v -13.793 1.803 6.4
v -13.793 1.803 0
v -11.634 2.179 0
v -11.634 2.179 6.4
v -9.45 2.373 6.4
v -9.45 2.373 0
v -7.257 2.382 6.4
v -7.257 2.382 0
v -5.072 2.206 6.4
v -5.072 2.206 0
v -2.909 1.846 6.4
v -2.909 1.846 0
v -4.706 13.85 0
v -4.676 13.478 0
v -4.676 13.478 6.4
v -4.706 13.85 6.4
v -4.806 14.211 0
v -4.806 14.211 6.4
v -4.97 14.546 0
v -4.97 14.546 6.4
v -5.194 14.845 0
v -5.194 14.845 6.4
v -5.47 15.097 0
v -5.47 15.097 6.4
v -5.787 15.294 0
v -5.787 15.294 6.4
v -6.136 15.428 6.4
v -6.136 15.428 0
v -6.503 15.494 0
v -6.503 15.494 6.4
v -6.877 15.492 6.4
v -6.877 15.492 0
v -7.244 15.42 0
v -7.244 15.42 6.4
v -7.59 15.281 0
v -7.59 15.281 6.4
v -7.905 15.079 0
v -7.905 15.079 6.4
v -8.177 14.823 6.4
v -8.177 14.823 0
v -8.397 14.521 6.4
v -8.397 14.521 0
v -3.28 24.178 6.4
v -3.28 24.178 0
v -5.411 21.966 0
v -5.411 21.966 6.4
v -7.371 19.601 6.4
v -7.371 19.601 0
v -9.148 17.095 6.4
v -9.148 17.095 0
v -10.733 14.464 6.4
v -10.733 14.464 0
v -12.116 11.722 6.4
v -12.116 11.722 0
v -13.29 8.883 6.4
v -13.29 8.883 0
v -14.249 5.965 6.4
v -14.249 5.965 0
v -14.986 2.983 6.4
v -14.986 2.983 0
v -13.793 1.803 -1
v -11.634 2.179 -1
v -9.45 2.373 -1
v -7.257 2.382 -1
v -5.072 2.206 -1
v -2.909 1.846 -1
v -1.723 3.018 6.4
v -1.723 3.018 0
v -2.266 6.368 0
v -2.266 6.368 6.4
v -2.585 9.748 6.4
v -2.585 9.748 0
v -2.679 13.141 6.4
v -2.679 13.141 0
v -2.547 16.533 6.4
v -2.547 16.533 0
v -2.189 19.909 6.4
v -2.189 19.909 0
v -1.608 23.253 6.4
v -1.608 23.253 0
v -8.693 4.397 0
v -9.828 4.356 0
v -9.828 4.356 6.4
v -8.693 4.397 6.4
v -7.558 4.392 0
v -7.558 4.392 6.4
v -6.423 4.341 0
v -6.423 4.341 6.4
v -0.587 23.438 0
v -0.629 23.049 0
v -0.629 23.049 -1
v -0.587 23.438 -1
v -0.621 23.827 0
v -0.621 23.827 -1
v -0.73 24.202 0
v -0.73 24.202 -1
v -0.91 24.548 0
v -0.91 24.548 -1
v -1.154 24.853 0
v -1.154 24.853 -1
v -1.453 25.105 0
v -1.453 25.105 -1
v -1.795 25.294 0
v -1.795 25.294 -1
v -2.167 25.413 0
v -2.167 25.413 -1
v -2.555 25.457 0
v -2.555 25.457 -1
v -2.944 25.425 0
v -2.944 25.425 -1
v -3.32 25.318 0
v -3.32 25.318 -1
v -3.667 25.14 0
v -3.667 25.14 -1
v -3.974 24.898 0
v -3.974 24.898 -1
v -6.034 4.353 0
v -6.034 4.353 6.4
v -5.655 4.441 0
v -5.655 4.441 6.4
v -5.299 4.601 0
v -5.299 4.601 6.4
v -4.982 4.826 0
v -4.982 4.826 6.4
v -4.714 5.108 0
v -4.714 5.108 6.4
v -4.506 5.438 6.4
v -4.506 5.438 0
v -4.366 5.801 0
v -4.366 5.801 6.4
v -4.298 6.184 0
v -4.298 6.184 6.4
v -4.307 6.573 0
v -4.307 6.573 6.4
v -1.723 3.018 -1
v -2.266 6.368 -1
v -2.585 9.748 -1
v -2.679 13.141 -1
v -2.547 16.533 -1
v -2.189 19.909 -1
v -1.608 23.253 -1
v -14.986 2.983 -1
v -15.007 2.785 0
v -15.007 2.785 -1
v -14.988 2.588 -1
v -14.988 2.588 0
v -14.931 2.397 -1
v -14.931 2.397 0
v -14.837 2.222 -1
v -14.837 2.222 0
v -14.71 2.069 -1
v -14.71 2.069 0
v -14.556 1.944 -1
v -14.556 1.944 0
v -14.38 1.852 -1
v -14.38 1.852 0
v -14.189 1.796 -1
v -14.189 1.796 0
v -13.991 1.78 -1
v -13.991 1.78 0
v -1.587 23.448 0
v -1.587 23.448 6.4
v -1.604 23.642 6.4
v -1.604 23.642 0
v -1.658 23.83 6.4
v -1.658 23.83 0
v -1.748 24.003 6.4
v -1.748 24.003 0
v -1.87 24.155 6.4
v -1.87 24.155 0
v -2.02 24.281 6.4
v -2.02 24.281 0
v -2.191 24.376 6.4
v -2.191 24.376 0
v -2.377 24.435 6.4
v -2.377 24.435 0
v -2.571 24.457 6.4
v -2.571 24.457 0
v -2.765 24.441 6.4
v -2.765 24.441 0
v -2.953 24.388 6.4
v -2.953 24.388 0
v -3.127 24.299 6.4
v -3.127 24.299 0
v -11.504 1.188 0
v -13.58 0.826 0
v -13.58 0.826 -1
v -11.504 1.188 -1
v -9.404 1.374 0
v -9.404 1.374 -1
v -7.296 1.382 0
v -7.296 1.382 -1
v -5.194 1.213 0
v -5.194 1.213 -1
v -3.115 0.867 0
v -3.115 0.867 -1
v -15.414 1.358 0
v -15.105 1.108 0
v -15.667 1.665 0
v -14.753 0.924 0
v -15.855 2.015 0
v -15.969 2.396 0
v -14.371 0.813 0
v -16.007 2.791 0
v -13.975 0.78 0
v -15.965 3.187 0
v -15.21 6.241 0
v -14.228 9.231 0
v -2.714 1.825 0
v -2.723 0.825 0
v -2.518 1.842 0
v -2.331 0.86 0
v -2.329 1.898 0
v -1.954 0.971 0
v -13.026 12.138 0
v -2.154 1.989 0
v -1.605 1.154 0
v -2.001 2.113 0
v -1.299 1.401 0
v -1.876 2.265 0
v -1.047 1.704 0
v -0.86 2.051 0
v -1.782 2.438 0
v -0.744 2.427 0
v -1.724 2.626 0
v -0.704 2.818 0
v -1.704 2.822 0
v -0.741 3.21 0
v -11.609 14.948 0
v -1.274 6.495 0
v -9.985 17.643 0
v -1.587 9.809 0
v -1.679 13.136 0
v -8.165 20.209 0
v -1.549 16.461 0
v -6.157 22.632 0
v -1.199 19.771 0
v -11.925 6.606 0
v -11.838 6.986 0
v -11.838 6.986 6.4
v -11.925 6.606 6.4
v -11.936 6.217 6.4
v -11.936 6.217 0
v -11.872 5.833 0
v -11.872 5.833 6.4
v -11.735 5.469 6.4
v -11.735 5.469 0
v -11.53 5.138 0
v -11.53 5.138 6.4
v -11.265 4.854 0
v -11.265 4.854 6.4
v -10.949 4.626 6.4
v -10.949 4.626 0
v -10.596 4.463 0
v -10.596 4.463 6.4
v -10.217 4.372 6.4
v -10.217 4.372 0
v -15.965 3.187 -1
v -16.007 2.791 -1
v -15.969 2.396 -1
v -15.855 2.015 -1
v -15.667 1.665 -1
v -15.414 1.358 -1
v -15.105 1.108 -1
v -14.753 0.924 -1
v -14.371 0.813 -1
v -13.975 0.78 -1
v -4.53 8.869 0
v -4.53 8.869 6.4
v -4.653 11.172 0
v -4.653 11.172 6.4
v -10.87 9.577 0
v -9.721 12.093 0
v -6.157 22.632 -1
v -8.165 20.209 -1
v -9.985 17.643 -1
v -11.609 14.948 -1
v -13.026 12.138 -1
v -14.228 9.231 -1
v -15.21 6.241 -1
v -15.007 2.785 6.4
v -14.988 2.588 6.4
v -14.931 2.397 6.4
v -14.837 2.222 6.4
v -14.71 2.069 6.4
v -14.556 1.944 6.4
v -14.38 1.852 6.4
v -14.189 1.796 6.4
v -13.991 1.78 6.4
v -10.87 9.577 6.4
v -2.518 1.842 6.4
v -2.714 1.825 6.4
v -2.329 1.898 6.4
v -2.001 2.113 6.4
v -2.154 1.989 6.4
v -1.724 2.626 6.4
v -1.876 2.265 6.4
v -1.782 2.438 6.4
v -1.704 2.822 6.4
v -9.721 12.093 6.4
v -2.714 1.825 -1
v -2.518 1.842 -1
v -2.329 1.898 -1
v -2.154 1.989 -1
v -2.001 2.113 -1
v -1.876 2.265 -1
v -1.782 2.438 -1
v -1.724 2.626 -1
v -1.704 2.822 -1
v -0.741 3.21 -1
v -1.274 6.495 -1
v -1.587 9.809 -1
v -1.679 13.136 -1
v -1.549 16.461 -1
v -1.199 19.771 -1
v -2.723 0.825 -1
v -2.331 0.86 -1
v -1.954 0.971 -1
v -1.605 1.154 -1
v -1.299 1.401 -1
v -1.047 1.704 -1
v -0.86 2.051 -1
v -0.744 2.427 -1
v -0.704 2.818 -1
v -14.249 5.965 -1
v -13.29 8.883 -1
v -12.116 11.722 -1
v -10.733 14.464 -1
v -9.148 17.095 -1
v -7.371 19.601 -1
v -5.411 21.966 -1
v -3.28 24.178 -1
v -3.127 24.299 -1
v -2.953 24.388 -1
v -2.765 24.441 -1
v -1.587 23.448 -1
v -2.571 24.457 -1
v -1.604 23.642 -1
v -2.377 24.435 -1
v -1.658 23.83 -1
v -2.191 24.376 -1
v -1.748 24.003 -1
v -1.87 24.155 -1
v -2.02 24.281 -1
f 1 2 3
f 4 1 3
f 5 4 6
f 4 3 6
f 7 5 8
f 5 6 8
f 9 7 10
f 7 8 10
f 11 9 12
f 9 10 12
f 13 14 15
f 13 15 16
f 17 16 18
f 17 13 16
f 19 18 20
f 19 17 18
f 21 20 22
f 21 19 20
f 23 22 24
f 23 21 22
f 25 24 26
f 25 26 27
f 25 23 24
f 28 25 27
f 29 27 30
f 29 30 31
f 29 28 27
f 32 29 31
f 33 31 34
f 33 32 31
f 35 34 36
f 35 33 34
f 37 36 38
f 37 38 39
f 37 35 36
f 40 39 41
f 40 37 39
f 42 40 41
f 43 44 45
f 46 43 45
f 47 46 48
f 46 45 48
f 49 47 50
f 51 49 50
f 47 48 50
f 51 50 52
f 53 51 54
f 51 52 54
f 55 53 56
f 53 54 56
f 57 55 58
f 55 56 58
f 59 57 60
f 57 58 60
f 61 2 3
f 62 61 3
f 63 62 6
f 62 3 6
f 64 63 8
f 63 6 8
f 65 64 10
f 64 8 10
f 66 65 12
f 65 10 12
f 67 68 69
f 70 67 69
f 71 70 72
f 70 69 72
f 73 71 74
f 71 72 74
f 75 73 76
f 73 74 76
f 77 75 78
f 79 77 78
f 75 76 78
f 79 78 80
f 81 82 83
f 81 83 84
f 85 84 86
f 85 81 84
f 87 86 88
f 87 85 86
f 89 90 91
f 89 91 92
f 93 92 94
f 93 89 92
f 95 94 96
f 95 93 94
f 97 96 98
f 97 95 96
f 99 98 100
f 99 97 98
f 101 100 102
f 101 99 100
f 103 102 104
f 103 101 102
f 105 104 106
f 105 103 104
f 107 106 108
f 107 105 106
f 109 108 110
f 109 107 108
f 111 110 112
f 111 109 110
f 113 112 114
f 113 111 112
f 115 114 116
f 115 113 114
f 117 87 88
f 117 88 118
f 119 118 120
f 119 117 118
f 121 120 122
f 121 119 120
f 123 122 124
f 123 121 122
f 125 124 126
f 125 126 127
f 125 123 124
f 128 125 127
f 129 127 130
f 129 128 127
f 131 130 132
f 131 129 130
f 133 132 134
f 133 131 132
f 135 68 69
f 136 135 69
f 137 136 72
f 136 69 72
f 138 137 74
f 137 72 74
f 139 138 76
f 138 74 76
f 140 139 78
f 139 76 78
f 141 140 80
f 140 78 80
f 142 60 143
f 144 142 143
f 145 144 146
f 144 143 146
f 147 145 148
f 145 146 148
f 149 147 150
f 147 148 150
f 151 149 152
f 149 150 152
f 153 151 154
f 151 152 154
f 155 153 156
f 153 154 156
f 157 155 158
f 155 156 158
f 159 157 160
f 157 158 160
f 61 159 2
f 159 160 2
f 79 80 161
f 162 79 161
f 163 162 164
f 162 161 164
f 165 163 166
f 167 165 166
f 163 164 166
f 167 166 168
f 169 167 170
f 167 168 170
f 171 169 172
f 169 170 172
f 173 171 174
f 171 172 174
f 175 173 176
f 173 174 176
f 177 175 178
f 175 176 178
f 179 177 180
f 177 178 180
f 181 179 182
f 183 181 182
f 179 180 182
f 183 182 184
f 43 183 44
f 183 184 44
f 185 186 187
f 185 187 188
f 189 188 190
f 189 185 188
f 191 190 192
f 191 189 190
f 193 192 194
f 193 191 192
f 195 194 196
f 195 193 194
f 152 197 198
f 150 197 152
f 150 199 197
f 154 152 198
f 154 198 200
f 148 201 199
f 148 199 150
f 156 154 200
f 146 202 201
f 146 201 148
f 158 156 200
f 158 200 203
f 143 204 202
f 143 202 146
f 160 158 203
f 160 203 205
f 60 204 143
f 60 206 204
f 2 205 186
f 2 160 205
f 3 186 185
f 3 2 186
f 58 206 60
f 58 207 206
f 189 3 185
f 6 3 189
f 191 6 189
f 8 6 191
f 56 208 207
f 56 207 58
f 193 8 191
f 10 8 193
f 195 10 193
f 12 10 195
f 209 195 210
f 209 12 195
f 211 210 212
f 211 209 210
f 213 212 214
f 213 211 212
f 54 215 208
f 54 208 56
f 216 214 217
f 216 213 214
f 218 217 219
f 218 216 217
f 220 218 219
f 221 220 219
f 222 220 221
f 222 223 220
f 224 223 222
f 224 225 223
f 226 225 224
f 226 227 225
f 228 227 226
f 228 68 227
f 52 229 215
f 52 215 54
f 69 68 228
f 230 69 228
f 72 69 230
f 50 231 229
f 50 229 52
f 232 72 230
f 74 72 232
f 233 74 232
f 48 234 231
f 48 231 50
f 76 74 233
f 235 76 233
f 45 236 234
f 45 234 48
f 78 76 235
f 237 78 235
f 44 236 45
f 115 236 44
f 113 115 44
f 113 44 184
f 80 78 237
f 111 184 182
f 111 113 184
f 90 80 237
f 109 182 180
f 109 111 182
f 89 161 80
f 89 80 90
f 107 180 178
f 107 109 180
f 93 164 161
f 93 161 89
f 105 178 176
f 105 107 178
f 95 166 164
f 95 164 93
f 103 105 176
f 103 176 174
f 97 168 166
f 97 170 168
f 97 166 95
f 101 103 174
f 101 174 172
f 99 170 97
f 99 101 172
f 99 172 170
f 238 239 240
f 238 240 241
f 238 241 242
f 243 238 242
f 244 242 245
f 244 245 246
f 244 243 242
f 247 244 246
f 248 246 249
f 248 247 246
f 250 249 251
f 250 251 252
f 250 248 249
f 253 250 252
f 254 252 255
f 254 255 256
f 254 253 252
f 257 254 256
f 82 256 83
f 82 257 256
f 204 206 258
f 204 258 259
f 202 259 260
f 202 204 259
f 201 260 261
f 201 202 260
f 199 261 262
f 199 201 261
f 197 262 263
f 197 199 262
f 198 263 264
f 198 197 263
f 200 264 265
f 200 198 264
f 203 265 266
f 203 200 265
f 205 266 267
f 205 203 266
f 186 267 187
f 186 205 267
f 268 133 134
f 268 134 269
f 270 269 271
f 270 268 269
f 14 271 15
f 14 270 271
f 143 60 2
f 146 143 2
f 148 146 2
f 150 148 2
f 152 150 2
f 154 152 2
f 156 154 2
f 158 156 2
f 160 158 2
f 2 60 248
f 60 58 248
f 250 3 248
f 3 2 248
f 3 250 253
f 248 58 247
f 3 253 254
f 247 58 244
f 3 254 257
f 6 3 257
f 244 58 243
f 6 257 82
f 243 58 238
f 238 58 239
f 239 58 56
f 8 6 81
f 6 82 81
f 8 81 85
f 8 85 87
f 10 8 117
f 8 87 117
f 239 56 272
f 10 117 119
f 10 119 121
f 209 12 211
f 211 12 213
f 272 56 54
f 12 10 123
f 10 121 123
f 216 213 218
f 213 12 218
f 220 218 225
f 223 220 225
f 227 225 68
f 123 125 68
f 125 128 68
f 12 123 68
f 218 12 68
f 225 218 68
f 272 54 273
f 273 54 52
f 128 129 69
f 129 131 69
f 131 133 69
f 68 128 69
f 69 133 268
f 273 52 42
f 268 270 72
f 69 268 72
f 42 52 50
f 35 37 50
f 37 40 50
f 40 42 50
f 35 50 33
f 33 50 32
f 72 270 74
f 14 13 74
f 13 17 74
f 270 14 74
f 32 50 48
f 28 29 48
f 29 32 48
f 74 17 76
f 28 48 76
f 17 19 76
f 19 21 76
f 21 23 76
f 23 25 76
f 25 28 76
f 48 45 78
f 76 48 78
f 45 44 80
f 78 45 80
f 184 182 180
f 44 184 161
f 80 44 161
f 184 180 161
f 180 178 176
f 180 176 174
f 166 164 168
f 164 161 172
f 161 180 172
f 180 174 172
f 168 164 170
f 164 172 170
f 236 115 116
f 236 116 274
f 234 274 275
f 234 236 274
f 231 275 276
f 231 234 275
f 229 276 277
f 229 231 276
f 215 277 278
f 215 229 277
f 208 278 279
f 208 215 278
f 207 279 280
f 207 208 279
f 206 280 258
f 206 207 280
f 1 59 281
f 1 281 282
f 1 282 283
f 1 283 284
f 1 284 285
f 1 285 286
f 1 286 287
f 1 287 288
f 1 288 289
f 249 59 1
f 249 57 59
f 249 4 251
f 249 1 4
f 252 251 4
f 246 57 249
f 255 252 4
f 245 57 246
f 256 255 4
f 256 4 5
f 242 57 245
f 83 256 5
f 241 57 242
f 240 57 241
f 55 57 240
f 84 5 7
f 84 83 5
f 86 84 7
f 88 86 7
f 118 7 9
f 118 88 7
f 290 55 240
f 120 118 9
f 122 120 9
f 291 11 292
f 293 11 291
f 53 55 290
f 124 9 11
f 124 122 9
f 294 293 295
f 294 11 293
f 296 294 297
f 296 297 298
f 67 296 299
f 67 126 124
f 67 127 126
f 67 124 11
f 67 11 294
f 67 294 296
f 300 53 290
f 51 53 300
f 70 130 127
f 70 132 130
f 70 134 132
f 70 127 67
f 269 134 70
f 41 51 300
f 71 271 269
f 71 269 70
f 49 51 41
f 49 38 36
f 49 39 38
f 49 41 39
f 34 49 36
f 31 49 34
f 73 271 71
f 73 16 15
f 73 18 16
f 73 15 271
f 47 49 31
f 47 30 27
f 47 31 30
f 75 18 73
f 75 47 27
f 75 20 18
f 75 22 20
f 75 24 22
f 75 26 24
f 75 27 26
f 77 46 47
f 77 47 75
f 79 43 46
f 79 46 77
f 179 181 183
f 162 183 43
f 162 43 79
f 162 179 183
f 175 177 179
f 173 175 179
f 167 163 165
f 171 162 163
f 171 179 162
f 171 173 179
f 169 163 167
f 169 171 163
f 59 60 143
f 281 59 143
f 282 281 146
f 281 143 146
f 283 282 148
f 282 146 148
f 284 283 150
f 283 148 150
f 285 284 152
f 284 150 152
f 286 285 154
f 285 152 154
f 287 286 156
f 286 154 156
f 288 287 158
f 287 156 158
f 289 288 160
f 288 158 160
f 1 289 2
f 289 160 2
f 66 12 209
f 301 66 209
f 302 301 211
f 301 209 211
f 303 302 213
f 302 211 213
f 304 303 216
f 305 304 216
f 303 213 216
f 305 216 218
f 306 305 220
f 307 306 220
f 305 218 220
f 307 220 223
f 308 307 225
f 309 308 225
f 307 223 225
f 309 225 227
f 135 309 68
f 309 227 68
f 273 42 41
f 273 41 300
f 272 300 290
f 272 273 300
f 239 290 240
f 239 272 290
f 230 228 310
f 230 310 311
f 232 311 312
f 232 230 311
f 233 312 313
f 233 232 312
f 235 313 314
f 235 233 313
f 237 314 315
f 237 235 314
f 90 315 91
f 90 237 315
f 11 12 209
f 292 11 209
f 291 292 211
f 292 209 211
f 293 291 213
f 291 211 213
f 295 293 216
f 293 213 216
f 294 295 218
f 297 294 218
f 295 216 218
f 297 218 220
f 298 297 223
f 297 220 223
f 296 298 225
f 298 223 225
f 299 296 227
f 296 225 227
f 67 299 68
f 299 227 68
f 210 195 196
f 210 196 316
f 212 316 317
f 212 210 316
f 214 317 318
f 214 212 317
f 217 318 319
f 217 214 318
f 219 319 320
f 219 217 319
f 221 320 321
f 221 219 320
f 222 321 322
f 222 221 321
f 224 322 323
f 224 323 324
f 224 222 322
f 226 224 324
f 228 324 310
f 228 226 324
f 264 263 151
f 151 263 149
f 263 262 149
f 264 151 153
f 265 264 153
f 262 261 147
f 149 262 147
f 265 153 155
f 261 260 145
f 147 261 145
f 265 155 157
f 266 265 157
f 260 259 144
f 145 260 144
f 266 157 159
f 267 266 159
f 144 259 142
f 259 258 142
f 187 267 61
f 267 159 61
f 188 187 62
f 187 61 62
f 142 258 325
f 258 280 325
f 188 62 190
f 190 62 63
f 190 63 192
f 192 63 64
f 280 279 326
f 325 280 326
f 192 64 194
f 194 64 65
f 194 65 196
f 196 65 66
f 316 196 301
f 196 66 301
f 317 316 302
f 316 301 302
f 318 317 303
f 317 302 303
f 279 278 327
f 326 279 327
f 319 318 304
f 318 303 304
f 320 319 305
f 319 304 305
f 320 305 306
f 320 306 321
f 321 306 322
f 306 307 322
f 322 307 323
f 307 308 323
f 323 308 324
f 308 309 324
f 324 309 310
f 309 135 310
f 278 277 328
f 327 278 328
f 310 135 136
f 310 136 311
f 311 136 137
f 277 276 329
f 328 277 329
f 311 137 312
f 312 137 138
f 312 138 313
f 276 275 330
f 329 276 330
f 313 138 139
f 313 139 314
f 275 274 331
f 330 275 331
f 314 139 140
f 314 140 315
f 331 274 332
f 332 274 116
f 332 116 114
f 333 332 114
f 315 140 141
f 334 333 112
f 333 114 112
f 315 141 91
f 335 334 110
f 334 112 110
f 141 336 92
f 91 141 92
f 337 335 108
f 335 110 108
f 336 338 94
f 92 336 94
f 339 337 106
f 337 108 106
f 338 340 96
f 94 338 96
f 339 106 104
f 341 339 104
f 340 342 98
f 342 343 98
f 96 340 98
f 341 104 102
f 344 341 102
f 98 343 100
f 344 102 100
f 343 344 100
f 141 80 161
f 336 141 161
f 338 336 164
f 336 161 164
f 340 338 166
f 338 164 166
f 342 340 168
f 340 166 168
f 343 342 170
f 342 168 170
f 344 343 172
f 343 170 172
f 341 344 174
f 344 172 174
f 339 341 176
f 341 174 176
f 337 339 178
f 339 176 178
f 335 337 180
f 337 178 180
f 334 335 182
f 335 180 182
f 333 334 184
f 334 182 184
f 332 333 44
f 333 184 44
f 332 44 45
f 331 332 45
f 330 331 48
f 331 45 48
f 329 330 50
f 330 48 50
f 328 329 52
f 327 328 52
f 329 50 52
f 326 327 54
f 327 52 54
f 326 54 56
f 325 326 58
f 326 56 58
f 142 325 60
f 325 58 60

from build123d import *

# Parameters (mm, degrees)
EXTRUDE_1_DEPTH = 6.4
EXTRUDE_2_DEPTH = 1


with BuildPart() as part:
    # 草图1 → 凸台-拉伸1 (new body)
    with BuildSketch(Plane.XY):
        with BuildLine():
            ThreePointArc((-1.607555315, 23.253403092), (-2.102834102, 24.33260587), (-3.280118278, 24.177745667))
            ThreePointArc((-3.280118278, 24.177745667), (-10.73316918, 14.464202841), (-14.985773436, 2.983077502))
            ThreePointArc((-14.985773436, 2.983077502), (-14.710247084, 2.069013261), (-13.793473674, 1.802639986))
            ThreePointArc((-13.793473674, 1.802639986), (-8.353711957, 2.400269849), (-2.909355589, 1.846056223))
            ThreePointArc((-2.909355589, 1.846056223), (-2.001398399, 2.113095791), (-1.722710728, 3.017545663))
            ThreePointArc((-1.722710728, 3.017545663), (-2.678876467, 13.141243248), (-1.607555315, 23.253403092))
        make_face()
        with BuildLine():
            ThreePointArc((-11.838265008, 6.985769863), (-10.31805168, 10.845138893), (-8.396540596, 14.521220098))
            ThreePointArc((-8.396540596, 14.521220098), (-6.135950273, 15.427541437), (-4.675992097, 13.478128935))
            ThreePointArc((-4.675992097, 13.478128935), (-4.604024648, 10.019753035), (-4.3066146, 6.573437547))
            ThreePointArc((-4.3066146, 6.573437547), (-4.841051661, 4.960613716), (-6.423033433, 4.340809432))
            ThreePointArc((-6.423033433, 4.340809432), (-8.12545588, 4.400199712), (-9.828339295, 4.355956396))
            ThreePointArc((-9.828339295, 4.355956396), (-11.530116514, 5.138298702), (-11.838265008, 6.985769863))
        make_face(mode=Mode.SUBTRACT)
    extrude(amount=EXTRUDE_1_DEPTH)


with BuildPart() as body_2:
    # 草图1<5> → 凸台-拉伸2 (new body)
    with BuildSketch(Plane.XY):
        with BuildLine():
            ThreePointArc((-15.964862672, 3.186508738), (-15.413809968, 1.358380256), (-13.580263148, 0.825633706))
            ThreePointArc((-13.580263148, 0.825633706), (-8.349723035, 1.400277805), (-3.11476499, 0.867380088))
            ThreePointArc((-3.11476499, 0.867380088), (-1.29885061, 1.401459224), (-0.741475267, 3.210358968))
            ThreePointArc((-0.741475267, 3.210358968), (-1.678892658, 13.135552679), (-0.628577803, 23.049434879))
            ThreePointArc((-0.628577803, 23.049434879), (-1.619135377, 25.207840435), (-3.97370373, 24.898120029))
            ThreePointArc((-3.97370373, 24.898120029), (-11.608536362, 14.947661524), (-15.964862672, 3.186508738))
        make_face()
        with BuildLine():
            ThreePointArc((-14.985773436, 2.983077502), (-10.73316918, 14.464202841), (-3.280118278, 24.177745667))
            ThreePointArc((-3.280118278, 24.177745667), (-2.102834102, 24.33260587), (-1.607555315, 23.253403092))
            ThreePointArc((-1.607555315, 23.253403092), (-2.678876467, 13.141243248), (-1.722710728, 3.017545663))
            ThreePointArc((-1.722710728, 3.017545663), (-2.001398399, 2.113095791), (-2.909355589, 1.846056223))
            ThreePointArc((-2.909355589, 1.846056223), (-8.353711957, 2.400269849), (-13.793473674, 1.802639986))
            ThreePointArc((-13.793473674, 1.802639986), (-14.710247084, 2.069013261), (-14.985773436, 2.983077502))
        make_face(mode=Mode.SUBTRACT)
    extrude(amount=-EXTRUDE_2_DEPTH)


solid = Compound([part.part, body_2.part])
